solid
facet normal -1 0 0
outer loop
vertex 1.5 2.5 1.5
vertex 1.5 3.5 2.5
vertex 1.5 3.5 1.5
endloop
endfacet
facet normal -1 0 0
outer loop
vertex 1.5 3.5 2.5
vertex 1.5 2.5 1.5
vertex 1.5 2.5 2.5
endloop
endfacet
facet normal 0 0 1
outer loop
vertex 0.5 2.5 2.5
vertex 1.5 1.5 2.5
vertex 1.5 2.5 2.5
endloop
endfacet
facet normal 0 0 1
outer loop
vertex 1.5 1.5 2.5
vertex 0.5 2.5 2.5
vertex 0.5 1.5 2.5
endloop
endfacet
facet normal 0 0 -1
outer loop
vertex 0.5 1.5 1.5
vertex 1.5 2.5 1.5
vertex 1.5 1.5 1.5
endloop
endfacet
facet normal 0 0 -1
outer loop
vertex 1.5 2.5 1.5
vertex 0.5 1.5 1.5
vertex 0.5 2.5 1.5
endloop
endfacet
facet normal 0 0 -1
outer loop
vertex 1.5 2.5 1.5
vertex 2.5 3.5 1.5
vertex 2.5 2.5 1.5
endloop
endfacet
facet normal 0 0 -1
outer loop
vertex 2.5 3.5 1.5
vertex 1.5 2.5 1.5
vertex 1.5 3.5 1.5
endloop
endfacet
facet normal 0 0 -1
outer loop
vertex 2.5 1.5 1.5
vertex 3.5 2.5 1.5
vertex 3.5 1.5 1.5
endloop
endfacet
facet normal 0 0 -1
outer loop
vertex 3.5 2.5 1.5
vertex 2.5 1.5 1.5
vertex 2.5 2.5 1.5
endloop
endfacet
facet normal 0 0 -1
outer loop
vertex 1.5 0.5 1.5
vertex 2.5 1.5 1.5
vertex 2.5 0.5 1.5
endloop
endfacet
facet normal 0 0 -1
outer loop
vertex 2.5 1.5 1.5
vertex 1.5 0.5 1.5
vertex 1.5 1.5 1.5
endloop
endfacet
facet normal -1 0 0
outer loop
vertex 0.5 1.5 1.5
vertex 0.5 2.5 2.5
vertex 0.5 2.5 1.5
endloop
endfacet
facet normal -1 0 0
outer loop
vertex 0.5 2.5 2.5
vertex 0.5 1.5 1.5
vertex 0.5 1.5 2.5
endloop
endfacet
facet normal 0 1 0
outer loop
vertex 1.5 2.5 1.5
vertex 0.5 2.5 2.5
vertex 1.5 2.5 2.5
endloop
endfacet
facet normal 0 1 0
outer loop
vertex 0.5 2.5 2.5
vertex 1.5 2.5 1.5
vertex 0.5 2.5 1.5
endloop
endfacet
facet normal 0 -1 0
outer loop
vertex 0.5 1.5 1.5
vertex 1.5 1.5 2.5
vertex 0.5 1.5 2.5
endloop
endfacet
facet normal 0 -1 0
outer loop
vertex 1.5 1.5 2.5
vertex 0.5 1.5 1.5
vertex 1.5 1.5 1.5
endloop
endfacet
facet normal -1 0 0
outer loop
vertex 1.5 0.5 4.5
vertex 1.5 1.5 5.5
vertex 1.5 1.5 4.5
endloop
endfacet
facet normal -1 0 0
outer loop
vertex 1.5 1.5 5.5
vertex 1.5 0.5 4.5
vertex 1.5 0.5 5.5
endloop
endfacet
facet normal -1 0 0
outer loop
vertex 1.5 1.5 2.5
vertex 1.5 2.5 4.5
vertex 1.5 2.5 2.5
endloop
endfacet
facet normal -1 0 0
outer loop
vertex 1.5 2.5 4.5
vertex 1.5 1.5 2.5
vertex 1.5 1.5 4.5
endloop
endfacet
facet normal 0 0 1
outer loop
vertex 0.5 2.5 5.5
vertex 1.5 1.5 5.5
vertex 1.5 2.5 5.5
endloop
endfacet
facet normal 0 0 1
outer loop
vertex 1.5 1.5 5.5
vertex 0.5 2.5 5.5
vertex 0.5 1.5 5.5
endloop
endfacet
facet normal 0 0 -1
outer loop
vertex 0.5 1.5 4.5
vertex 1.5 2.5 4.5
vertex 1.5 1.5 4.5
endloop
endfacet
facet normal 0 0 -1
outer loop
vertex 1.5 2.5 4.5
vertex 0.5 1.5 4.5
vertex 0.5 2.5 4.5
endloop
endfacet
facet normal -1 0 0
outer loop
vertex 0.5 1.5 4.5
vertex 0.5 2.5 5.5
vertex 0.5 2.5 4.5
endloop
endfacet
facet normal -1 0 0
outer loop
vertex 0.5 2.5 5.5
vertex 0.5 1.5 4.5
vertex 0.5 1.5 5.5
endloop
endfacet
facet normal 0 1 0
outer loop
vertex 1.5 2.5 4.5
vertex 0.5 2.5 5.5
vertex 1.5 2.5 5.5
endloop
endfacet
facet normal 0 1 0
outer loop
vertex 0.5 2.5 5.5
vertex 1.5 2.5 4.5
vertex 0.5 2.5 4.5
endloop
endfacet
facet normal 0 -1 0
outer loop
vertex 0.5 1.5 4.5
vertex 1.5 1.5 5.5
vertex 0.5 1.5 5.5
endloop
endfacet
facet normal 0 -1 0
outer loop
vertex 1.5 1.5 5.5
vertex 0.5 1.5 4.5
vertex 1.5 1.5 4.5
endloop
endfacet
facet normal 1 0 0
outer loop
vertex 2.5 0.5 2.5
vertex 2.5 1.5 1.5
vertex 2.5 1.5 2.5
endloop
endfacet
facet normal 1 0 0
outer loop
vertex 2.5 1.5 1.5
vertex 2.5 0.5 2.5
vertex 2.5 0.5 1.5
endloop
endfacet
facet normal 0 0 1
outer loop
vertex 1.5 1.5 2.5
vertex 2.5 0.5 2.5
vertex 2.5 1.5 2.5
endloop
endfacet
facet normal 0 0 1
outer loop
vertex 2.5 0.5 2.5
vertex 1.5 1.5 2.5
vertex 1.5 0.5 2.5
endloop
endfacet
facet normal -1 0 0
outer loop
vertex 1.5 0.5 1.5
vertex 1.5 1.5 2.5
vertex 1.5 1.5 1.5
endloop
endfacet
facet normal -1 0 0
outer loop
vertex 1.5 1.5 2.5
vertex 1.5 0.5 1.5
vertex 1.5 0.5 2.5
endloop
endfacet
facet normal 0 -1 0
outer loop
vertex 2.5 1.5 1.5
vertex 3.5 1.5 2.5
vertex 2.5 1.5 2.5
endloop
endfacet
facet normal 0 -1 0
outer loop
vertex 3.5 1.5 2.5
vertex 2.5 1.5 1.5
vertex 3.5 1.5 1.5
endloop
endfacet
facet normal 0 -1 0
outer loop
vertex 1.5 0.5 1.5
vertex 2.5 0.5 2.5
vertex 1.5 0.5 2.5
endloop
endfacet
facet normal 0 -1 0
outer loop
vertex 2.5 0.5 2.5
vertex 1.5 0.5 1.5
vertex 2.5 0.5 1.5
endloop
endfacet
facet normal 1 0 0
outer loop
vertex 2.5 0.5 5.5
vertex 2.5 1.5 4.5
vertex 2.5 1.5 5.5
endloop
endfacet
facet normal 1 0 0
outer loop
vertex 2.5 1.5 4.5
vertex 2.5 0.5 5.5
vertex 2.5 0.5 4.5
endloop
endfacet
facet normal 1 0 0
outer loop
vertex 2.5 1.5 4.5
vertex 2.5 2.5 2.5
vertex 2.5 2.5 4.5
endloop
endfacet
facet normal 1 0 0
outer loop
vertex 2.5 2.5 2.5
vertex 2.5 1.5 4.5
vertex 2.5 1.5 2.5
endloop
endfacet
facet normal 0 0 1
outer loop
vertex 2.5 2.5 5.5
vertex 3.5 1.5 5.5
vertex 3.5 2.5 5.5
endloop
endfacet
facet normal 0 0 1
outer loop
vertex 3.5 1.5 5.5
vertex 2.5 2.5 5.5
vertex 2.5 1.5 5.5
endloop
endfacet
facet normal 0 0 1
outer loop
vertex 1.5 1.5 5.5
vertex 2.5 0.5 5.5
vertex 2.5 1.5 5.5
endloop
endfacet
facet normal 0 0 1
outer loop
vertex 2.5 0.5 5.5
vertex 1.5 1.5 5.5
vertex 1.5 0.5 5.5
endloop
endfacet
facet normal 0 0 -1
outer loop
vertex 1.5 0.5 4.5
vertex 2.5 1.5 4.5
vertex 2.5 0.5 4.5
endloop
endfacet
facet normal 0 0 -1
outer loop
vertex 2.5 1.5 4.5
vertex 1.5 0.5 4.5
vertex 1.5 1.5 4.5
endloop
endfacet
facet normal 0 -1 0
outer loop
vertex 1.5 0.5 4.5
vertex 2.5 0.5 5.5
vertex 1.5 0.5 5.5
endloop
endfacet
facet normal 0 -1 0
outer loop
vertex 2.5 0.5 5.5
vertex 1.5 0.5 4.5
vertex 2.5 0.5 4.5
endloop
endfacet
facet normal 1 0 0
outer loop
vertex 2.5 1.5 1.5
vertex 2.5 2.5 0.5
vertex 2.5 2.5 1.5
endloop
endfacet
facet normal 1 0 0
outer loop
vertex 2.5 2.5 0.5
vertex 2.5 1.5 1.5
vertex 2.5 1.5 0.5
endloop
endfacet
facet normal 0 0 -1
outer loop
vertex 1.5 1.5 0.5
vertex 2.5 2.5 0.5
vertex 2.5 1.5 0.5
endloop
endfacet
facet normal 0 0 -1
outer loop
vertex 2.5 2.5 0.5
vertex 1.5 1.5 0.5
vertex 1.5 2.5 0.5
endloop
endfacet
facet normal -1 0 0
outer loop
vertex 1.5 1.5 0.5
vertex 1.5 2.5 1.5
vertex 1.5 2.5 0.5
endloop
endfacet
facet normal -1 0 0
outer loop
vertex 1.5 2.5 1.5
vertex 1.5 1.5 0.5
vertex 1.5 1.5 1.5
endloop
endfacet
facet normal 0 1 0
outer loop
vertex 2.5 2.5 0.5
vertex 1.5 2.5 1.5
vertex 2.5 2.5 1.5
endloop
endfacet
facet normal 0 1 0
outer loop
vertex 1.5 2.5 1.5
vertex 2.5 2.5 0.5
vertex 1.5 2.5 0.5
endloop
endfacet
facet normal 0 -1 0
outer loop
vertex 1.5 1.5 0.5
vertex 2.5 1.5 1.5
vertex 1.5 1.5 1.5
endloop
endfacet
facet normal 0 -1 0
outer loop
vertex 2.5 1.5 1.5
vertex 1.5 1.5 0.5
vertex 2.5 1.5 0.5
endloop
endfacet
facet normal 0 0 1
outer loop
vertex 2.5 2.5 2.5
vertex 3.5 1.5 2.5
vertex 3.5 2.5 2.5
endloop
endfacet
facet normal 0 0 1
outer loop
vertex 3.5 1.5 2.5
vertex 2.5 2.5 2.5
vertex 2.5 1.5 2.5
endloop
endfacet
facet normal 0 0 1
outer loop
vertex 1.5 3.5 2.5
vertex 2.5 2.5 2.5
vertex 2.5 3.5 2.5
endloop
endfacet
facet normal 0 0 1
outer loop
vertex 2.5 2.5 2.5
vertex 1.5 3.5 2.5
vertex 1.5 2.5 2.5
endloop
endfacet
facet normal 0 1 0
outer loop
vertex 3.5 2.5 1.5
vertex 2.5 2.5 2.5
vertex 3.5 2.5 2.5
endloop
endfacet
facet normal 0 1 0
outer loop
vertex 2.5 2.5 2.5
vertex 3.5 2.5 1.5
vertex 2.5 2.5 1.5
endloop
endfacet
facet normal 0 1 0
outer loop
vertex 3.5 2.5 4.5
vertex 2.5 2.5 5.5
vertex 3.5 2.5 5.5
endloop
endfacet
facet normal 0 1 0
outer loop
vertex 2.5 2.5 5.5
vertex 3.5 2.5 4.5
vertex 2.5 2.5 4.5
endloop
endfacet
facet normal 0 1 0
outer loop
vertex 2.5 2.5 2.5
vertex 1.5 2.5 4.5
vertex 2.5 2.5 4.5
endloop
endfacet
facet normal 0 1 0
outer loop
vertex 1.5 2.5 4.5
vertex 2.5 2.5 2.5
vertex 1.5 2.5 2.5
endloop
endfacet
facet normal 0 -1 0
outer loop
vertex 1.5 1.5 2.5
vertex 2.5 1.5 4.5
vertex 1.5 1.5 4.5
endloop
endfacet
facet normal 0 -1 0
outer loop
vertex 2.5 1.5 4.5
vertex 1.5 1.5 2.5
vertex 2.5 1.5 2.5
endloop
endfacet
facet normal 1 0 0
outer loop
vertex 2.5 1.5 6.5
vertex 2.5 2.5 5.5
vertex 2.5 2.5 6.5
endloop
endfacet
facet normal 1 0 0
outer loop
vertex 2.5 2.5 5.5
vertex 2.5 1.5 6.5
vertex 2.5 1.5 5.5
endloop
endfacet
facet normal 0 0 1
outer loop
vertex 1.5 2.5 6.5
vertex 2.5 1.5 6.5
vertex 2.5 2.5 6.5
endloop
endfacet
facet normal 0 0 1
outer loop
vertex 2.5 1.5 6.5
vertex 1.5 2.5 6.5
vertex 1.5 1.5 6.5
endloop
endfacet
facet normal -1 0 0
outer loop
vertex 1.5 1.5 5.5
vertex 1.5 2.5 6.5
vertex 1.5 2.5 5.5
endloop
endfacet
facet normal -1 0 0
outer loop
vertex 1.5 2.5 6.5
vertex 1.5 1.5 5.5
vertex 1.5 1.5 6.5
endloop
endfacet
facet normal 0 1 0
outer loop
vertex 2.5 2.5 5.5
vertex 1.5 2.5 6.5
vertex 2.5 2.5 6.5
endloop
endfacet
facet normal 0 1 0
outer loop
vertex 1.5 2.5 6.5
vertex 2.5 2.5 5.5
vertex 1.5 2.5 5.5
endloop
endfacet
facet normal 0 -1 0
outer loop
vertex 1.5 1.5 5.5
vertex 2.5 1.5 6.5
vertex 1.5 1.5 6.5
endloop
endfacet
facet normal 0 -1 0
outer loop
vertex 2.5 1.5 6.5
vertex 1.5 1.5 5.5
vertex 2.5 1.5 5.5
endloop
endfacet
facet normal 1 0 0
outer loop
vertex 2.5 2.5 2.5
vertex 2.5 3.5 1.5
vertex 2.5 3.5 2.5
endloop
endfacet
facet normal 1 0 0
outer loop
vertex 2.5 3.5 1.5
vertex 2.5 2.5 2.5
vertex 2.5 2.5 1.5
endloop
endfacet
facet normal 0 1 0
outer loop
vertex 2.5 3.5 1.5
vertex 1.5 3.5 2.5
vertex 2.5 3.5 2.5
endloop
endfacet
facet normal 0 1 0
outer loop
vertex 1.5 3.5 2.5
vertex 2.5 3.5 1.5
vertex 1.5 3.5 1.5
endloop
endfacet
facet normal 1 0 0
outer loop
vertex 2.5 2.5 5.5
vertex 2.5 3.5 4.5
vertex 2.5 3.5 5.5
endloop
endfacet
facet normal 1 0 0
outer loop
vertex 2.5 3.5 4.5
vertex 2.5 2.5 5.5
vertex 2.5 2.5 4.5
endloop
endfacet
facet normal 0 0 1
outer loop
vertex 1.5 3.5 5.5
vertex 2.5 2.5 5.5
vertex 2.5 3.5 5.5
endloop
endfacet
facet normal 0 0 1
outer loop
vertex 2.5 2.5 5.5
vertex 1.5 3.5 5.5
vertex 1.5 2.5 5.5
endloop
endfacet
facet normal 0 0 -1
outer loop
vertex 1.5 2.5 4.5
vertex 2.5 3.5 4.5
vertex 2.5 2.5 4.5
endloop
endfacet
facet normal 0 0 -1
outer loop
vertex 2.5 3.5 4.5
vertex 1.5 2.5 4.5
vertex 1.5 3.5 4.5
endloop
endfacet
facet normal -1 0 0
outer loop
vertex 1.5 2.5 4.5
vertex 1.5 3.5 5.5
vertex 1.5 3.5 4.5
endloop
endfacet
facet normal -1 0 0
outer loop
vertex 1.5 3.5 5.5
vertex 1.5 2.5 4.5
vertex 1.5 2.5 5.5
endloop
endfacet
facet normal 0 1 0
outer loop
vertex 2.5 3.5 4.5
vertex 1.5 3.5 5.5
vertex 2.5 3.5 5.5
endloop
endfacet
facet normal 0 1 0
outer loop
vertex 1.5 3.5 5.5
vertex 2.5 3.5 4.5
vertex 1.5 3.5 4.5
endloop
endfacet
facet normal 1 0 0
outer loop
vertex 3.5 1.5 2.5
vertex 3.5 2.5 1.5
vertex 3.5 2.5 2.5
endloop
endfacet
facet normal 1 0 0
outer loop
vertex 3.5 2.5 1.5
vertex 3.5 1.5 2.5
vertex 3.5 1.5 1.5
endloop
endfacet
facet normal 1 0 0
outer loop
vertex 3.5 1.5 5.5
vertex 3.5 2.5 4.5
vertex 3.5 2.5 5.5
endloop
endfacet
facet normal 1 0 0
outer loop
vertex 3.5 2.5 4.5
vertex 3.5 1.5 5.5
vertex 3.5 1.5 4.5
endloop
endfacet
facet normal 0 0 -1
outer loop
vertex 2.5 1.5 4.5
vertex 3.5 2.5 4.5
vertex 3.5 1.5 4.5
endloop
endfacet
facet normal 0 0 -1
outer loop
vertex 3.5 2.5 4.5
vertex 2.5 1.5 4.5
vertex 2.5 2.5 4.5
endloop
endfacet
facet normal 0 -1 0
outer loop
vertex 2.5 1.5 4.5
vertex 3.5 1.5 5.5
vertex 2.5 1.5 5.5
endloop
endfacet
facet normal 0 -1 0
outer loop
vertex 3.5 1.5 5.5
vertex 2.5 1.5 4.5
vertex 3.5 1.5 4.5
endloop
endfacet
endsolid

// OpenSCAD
module Droplet() {
	translate([1,2,2])
		cube([1,1,1],true);
	translate([1,2,5])
		cube([1,1,1],true);
	translate([2,1,2])
		cube([1,1,1],true);
	translate([2,1,5])
		cube([1,1,1],true);
	translate([2,2,1])
		cube([1,1,1],true);
	translate([2,2,2])
		cube([1,1,1],true);
	translate([2,2,3])
		cube([1,1,1],true);
	translate([2,2,4])
		cube([1,1,1],true);
	translate([2,2,5])
		cube([1,1,1],true);
	translate([2,2,6])
		cube([1,1,1],true);
	translate([2,3,2])
		cube([1,1,1],true);
	translate([2,3,5])
		cube([1,1,1],true);
	translate([3,2,2])
		cube([1,1,1],true);
	translate([3,2,5])
		cube([1,1,1],true);
}
Droplet();
